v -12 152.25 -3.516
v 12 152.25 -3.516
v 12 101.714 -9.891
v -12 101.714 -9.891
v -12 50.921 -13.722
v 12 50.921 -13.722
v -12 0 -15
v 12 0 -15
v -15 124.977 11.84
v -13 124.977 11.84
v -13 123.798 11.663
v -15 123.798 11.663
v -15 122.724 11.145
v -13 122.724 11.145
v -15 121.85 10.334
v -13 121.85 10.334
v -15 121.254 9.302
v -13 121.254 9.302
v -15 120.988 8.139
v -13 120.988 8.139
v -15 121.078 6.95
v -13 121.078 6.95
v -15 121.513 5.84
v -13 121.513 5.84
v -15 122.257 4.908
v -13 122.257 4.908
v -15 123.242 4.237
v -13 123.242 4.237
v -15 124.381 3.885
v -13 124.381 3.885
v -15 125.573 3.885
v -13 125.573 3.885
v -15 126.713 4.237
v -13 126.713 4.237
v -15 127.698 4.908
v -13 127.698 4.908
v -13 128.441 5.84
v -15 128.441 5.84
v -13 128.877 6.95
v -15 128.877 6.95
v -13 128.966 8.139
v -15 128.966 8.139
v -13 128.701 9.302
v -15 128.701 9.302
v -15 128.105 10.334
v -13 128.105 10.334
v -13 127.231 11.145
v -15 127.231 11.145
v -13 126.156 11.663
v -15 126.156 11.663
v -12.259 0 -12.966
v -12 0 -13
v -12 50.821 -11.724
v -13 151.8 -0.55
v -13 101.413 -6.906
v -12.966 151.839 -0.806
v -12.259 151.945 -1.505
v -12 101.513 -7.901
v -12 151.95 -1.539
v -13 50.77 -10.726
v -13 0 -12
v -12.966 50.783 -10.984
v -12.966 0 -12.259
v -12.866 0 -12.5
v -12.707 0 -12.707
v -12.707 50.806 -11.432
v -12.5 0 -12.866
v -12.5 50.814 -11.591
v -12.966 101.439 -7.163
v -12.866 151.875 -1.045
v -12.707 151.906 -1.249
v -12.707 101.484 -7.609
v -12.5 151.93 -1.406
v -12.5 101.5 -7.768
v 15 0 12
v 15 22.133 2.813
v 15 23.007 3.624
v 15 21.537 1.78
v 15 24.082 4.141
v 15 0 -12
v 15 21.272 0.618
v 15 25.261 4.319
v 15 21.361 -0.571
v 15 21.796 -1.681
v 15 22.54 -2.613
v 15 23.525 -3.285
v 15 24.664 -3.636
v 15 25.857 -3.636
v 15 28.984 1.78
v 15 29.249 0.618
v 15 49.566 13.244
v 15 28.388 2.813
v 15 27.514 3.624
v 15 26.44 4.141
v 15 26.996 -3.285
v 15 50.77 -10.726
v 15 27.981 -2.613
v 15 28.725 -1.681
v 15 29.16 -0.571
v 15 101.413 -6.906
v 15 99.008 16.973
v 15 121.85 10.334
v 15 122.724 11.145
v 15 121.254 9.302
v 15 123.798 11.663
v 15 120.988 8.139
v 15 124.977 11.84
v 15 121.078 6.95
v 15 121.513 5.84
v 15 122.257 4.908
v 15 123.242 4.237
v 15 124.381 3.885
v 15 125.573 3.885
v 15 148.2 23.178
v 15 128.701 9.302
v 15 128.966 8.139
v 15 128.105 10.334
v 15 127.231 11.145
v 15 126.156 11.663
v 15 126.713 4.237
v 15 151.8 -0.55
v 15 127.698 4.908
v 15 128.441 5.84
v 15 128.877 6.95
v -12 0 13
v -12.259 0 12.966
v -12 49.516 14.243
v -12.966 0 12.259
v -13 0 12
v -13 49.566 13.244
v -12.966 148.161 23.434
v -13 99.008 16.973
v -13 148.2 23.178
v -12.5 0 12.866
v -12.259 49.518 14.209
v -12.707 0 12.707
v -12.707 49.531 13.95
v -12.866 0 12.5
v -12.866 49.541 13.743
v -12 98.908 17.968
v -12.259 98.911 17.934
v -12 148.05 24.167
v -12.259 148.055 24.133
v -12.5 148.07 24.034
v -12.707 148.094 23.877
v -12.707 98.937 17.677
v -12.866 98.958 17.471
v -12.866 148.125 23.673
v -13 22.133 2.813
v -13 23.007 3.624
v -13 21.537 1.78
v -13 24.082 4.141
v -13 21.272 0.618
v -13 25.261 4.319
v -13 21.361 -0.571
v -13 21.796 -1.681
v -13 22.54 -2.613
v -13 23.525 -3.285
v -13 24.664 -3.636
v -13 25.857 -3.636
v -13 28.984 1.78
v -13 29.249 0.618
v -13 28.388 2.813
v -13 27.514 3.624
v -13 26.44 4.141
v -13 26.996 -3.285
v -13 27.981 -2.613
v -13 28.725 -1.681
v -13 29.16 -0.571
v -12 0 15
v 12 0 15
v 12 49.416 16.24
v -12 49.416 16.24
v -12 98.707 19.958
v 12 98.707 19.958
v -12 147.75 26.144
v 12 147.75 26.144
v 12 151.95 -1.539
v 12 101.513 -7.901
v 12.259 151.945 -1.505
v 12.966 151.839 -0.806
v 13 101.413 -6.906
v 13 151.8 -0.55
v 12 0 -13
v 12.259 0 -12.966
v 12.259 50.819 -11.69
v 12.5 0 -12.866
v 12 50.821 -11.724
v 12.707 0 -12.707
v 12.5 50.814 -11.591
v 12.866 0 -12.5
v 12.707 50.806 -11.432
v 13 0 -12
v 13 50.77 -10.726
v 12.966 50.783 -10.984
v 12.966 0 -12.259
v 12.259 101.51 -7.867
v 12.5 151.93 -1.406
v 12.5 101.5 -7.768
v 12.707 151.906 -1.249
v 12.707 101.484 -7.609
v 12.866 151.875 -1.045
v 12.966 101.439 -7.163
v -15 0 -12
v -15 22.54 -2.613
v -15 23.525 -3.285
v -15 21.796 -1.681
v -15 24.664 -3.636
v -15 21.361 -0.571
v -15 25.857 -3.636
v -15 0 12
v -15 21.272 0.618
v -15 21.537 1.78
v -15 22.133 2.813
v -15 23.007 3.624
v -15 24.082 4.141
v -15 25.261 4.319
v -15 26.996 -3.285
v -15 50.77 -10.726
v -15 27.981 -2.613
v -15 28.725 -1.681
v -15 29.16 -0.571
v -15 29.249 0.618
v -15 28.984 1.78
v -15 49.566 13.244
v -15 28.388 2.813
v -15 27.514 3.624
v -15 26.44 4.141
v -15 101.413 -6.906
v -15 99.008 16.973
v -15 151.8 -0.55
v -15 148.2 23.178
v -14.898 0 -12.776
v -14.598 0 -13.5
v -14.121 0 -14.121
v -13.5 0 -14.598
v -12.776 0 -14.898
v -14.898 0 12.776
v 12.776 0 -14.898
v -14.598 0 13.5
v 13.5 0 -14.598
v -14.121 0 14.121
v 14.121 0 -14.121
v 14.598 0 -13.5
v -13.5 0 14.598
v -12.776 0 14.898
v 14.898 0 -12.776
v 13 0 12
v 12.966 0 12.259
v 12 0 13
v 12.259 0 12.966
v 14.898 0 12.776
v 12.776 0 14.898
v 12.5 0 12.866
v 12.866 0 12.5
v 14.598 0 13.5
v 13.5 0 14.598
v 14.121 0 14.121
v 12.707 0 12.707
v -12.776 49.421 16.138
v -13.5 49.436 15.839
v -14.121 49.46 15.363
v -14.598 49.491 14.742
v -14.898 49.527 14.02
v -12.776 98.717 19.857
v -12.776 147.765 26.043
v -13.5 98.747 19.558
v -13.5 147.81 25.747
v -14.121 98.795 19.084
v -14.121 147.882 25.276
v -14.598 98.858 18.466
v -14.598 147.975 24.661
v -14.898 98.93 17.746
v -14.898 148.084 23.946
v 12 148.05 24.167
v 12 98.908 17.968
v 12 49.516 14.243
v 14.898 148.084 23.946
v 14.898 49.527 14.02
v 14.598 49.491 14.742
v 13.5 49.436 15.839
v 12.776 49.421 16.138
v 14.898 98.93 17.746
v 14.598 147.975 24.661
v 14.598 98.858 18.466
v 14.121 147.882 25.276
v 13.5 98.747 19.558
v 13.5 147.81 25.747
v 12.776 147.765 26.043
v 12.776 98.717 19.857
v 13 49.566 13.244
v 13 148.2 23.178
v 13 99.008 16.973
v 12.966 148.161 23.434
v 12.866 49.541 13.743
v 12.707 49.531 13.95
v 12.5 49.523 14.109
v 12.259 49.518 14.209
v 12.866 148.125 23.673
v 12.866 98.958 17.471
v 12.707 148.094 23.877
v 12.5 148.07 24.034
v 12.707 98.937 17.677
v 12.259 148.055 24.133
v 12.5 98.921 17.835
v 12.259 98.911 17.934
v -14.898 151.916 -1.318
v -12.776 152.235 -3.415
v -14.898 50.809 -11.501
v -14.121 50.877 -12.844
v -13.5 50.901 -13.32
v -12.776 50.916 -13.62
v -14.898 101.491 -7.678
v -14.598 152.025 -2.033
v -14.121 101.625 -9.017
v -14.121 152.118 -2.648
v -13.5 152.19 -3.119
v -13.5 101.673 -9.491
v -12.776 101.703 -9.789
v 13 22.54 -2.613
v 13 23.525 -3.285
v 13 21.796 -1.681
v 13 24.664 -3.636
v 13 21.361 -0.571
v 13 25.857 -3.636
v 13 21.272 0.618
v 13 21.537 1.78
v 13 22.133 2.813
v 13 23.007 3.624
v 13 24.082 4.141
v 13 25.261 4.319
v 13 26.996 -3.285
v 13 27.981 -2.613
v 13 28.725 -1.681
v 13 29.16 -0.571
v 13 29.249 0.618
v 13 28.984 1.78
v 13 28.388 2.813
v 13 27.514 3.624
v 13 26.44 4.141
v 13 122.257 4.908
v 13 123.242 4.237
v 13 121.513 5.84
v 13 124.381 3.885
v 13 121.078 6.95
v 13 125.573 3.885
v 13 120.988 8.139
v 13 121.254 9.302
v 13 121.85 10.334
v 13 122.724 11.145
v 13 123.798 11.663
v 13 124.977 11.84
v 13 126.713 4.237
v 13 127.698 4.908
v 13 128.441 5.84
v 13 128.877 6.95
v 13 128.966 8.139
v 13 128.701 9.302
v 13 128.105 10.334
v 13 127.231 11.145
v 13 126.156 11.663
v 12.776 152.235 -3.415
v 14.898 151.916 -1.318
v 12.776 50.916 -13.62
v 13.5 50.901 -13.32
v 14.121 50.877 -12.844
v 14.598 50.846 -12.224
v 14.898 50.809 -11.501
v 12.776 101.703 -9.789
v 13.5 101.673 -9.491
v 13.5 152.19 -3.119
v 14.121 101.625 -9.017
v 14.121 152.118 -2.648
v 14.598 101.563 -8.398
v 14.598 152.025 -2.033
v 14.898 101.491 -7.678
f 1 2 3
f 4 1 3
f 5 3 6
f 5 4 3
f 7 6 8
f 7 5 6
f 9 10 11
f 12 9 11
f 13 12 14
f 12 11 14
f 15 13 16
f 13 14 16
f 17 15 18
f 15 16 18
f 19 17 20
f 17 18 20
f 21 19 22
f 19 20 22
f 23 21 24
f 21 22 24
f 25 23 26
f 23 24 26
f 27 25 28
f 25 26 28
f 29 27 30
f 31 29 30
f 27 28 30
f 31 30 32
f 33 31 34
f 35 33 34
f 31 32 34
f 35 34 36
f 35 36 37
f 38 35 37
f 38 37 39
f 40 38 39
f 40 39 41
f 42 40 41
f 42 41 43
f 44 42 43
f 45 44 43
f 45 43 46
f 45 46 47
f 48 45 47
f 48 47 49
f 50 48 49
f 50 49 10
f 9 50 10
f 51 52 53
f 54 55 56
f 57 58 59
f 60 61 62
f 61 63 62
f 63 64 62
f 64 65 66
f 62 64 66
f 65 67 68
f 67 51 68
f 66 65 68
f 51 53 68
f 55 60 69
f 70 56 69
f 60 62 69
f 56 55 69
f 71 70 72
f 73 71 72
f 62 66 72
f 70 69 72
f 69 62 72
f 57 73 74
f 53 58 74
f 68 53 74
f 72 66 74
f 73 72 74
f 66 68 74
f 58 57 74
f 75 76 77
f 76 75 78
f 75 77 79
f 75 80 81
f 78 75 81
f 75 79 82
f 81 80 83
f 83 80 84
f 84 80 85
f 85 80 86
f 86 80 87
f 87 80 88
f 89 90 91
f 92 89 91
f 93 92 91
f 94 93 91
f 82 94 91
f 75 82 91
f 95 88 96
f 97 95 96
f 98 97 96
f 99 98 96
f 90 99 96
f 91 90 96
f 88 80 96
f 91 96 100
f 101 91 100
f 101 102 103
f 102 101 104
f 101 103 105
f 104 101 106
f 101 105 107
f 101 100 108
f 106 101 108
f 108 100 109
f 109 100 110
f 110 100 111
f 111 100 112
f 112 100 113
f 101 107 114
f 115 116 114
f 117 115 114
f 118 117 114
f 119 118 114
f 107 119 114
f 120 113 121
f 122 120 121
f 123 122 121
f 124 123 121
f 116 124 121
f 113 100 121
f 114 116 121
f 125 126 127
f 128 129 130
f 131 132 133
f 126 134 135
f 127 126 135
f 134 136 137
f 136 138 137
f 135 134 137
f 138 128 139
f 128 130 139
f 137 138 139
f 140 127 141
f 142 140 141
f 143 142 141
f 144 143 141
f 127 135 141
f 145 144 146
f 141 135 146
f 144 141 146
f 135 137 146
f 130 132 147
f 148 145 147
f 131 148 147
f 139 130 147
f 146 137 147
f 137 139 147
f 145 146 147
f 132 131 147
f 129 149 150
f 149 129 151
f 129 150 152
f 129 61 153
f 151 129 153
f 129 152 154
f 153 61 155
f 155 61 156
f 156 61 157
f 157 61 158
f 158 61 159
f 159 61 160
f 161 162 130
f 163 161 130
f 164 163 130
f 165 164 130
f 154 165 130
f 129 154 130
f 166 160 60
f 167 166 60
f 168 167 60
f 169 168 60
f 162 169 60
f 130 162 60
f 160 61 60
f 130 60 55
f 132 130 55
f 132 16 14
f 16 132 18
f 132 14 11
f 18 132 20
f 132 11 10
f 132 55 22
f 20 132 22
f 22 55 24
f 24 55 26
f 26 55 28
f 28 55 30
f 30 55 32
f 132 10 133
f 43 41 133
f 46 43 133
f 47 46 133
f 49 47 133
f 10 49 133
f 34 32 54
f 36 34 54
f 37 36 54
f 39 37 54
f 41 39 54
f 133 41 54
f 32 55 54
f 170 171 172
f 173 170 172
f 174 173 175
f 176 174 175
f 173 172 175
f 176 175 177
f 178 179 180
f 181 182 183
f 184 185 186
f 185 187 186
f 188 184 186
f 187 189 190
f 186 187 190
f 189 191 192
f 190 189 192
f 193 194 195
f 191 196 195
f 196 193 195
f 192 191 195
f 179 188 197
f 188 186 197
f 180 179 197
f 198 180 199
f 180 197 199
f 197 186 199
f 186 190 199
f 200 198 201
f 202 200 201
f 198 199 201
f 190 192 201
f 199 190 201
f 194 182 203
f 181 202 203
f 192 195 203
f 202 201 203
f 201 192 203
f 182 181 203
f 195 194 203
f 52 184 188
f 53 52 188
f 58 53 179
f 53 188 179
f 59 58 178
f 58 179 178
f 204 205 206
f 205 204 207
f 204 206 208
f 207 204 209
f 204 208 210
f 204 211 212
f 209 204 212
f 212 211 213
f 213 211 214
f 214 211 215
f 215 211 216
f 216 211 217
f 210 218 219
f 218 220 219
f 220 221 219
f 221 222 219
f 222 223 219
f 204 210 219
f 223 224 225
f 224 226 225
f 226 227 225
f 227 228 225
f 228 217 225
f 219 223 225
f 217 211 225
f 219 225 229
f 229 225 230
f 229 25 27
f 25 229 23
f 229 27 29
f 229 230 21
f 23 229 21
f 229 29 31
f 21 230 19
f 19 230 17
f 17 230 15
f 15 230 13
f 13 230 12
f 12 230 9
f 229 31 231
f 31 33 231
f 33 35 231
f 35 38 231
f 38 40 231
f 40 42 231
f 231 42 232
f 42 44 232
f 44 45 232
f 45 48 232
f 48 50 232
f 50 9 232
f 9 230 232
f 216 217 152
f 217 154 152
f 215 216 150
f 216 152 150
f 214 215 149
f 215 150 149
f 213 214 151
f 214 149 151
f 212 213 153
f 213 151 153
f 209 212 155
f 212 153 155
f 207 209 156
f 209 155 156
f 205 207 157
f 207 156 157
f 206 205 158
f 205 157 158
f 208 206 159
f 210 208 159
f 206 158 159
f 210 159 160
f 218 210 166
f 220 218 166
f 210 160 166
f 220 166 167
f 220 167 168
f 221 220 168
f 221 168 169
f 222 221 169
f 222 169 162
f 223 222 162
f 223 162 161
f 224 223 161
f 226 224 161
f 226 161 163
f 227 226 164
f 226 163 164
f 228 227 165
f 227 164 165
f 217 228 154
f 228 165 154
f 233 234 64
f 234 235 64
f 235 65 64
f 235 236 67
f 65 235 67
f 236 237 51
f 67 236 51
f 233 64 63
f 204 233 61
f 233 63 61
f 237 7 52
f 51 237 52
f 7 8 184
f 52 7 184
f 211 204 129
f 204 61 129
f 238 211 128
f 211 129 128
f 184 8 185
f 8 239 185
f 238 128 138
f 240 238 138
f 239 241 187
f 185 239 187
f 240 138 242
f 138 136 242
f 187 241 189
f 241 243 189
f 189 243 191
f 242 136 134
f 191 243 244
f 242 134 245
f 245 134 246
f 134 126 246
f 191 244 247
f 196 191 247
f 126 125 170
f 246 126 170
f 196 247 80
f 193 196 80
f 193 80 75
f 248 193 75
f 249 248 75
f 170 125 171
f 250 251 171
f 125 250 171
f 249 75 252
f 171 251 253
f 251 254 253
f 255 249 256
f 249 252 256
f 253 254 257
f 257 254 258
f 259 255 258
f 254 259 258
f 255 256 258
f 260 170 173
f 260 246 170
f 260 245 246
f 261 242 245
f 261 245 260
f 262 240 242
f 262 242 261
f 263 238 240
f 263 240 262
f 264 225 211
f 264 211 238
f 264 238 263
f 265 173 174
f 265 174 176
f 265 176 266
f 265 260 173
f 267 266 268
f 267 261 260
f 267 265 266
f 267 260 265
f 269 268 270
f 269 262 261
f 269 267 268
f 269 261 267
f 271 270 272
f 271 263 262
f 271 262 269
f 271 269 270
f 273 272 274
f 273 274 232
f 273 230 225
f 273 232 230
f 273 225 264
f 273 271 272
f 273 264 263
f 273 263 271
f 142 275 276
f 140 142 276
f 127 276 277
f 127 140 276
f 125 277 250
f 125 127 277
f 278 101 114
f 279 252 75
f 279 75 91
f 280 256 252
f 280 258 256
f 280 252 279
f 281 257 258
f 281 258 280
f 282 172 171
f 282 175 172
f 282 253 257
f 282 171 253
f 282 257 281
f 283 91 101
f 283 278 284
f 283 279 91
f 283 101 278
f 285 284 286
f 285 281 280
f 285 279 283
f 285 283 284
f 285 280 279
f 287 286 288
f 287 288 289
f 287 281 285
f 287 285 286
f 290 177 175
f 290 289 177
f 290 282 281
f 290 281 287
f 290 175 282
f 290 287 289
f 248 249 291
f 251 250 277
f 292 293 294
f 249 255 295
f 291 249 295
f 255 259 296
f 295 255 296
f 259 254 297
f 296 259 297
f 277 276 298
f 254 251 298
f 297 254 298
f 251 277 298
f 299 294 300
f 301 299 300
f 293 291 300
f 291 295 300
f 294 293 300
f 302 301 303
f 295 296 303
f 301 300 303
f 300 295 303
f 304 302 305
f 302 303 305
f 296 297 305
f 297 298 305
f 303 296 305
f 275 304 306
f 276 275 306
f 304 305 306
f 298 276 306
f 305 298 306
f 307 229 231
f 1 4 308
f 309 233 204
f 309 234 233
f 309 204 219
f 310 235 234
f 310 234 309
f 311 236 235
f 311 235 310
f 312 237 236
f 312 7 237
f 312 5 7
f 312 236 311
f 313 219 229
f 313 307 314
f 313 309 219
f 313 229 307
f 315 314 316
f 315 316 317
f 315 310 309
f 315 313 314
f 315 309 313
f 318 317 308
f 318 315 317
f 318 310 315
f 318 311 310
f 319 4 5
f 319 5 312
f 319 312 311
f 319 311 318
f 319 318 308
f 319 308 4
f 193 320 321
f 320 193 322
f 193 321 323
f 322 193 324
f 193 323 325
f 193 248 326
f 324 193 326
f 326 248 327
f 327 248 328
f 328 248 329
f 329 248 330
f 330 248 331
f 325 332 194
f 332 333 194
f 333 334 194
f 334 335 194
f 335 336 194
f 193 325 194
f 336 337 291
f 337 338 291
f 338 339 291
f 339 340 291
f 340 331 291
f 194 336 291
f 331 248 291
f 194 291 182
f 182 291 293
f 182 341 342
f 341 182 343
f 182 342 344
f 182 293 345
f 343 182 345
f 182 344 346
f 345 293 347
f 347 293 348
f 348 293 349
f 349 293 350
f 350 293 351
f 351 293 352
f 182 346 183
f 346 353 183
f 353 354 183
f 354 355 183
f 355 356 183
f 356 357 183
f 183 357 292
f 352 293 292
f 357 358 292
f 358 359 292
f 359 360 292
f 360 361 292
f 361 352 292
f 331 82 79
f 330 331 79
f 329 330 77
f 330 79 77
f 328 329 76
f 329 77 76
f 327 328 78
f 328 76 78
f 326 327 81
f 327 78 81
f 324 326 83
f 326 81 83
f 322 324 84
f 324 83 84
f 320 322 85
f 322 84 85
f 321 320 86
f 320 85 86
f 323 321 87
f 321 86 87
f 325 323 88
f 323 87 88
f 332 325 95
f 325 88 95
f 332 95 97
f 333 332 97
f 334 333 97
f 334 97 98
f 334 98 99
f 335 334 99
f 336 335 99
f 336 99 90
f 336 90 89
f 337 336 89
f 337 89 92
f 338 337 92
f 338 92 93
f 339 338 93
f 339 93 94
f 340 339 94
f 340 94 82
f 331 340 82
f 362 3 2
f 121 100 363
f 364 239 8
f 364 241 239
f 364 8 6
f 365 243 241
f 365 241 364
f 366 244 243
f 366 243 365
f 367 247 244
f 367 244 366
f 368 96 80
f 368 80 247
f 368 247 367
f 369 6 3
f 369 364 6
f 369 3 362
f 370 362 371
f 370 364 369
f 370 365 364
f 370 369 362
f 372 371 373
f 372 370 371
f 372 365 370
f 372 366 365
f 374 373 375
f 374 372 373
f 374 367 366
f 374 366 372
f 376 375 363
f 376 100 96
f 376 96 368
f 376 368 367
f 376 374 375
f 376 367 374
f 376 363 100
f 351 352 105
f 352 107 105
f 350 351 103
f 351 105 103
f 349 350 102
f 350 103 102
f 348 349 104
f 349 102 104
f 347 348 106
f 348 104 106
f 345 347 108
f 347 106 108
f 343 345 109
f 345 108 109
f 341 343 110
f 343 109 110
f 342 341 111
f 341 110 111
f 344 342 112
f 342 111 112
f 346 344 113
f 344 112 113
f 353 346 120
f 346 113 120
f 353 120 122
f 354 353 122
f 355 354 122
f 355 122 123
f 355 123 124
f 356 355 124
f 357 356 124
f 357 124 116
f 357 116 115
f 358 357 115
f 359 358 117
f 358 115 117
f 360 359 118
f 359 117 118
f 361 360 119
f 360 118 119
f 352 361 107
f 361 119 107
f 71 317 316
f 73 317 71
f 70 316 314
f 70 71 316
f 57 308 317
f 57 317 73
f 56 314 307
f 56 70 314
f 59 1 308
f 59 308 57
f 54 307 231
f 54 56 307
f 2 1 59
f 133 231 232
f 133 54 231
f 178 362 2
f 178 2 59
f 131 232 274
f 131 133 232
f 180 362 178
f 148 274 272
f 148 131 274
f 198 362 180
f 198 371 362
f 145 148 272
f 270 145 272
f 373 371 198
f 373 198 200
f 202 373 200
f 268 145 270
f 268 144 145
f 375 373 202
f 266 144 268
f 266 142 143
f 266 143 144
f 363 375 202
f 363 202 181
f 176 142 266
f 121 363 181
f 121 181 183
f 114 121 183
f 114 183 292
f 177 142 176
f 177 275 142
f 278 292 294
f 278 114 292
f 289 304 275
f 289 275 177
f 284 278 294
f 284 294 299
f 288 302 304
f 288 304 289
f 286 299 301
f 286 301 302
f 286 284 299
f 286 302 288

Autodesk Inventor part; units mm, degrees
ref_plane "YZ Plane" through (0, 0, 0) normal (1, 0, 0) x (0, 1, 0)
ref_plane "XZ Plane" through (0, 0, 0) normal (0, 1, 0) x (-1, 0, 0)
sketch "Sketch1" plane through (0, 0, 0) normal (0, 1, 0) x (-1, 0, 0)
  line L0 (-12, 14) -> (12, 14) construction
  line L1 (14, 12) -> (14, -12) construction
  line L2 (12, -14) -> (-12, -14) construction
  line L3 (-14, -12) -> (-14, 12) construction
  line L4 (-14, 14) -> (14, -14) construction
  line L5 (14, 14) -> (-14, -14) construction
  arc A0 (14, 12) -> (12, 14) centre (12, 12) ccw construction
  arc A1 (12, -14) -> (14, -12) centre (12, -12) ccw construction
  arc A2 (-14, -12) -> (-12, -14) centre (-12, -12) ccw construction
  arc A3 (-12, 14) -> (-14, 12) centre (-12, 12) ccw construction
  line L6 (-12, -15) -> (12, -15)
  arc A4 (12, -15) -> (15, -12) centre (12, -12) ccw
  line L7 (15, -12) -> (15, 12)
  arc A5 (15, 12) -> (12, 15) centre (12, 12) ccw
  line L8 (12, 15) -> (-12, 15)
  arc A6 (-12, 15) -> (-15, 12) centre (-12, 12) ccw
  line L9 (-15, 12) -> (-15, -12)
  arc A7 (-15, -12) -> (-12, -15) centre (-12, -12) ccw
  line L10 (13, -12) -> (13, 12)
  arc A8 (13, 12) -> (12, 13) centre (12, 12) ccw
  line L11 (12, 13) -> (-12, 13)
  arc A9 (-12, 13) -> (-13, 12) centre (-12, 12) ccw
  line L12 (-13, 12) -> (-13, -12)
  arc A10 (-13, -12) -> (-12, -13) centre (-12, -12) ccw
  line L13 (-12, -13) -> (12, -13)
  arc A11 (12, -13) -> (13, -12) centre (12, -12) ccw
  point P0 (0, 0)
  point P1 (0, 0)
  point P2 (0, 0)
  dimension "d10" = 2
  dimension "depth" = 30
  dimension "width" = 30
  dimension "thickness" = 2
sketch "Sketch3" plane through (0, 0, 0) normal (1, 0, 0) x (0, 1, 0)
  line L0 (0, 0) -> (0, 2000) construction
  arc A0 (0, 0) -> (150, 11.314) centre (0, 1000) ccw
  line L1 (0, -403.3894) -> (0, 2400.5649) projected
  line L2 (-30.3433, 0) -> (182.0598, 0) projected
  line L3 (0, 1000) -> (151.7165, 0) construction
  dimension "d30" = 2000
  dimension "d31" = 1000
  dimension "d61" = 150
sweep "Sweep1" add profiles "Sketch1" path "Sketch3" path curves A0
ref_plane "Work Plane3" through (-12, 0, 1000) normal (0, -0.9972, -0.0752) x (1, 0, 0)
sketch "Sketch5" plane through (-15, 0, 1000) normal (-1, 0, 0) x (0, 0.9972, 0.0752)
  arc A0 (75.213, 997.1675) -> (-75.213, 997.1675) centre (0, 0) ccw construction
  line L0 (0, 0) -> (0, 1000) construction
  point P0 (-50, 998.7492)
  point P1 (50, 998.7492)
  dimension "d64" = 100
hole "Hole3" at (-15, 124.9773, 7.8404) at (-15, 25.2606, 0.3191) direction (1, 0, 0) diameter 8 depth 40 tip angle 118
equation "\"d10\" = thickness"
equation "\"d31\" = 0.5 * d30"
properties part number "podest duzy profil 7" material "Steel"
